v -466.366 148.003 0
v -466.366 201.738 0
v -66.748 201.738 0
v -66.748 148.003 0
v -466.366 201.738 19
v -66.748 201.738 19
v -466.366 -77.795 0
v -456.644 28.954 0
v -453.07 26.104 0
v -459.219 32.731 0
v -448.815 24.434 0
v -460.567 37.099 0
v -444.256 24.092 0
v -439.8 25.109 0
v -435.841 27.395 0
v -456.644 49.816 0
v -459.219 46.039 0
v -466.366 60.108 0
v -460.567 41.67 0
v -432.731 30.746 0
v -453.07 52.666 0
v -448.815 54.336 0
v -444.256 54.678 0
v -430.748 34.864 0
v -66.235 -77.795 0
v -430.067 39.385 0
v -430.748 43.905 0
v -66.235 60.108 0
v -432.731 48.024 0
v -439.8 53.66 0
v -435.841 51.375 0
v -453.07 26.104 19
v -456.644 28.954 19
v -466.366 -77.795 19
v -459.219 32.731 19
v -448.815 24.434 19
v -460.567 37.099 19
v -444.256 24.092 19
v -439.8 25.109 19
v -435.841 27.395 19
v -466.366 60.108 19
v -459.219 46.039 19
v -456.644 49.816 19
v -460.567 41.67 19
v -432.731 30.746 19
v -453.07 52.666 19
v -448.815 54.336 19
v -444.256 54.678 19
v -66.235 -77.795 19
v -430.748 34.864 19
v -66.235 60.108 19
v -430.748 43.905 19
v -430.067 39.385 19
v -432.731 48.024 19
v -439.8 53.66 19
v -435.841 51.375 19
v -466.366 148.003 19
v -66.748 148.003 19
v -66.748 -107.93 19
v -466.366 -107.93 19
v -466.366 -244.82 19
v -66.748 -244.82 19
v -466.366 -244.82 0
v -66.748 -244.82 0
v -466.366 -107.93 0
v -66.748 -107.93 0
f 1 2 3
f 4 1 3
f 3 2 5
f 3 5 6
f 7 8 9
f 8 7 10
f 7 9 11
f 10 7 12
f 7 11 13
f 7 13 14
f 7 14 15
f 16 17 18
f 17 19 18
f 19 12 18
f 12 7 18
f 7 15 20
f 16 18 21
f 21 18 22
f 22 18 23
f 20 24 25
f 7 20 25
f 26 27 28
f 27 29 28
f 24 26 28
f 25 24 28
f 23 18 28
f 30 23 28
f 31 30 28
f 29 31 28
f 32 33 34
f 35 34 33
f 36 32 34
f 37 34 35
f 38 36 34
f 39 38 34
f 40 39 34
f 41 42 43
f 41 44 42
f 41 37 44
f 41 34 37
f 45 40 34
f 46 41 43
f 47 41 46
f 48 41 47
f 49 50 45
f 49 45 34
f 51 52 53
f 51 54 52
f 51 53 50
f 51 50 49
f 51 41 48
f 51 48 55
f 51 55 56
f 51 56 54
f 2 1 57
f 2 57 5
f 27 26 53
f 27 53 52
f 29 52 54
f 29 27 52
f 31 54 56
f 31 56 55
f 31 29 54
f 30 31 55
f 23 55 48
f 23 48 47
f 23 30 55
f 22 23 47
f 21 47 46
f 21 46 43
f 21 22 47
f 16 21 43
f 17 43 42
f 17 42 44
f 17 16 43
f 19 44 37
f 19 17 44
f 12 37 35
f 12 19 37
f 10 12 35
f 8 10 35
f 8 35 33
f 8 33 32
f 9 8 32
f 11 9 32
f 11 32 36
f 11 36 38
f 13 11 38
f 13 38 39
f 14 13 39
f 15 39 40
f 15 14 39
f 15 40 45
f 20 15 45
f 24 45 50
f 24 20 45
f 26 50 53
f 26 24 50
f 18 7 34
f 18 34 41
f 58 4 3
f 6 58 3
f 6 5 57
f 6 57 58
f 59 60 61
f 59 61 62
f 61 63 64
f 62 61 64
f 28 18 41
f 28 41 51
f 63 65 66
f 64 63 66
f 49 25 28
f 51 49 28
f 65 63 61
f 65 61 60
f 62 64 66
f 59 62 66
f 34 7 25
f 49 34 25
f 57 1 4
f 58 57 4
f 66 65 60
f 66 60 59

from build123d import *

# Parameters (mm, degrees)
F0_W     = 399.618358
F0_H     = 136.889741
F0_H_2   = 53.735167
F0_W_2   = 400.13127
F0_H_3   = 137.90302
F0_R     = 15.335777
F0_R_2   = 10.233177
F1_DEPTH = 19


with BuildPart() as f1:
    # F0 (on Top) → F1 (new body)
    with BuildSketch(Plane.XY):
        with Locations((-266.556695, -176.374637)):
            Rectangle(F0_W, F0_H)
        with Locations((-266.556695, 174.870669)):
            Rectangle(F0_W, F0_H_2)
        with Locations((-266.300239, -8.843094)):
            Rectangle(F0_W_2, F0_H_3)
        with BuildLine():
            ThreePointArc((-336.545243, -28.746858), (-350.150513, -34.382346), (-344.515026, -20.777075))
            ThreePointArc((-344.515026, -20.777075), (-338.879538, -23.111371), (-336.545243, -28.746858))
        make_face(mode=Mode.SUBTRACT)
        with Locations((-445.402294, 39.384797)):
            Circle(F0_R, mode=Mode.SUBTRACT)
        Polygon((-354.99683, 0), (-344.515026, 32.833677), (-336.65368, 0), (-344.515026, -9.322512), align=None, mode=Mode.SUBTRACT)
        Polygon((-297.34695, 0), (-284.244716, 32.833677), (-272.251386, 0), (-246.248215, -14.33439), (-272.251386, -23.586301), (-284.244716, -53.641111), (-297.34695, -24.791258), (-323.551446, -14.33439), align=None, mode=Mode.SUBTRACT)
        with BuildLine():
            ThreePointArc((-336.545243, -28.746858), (-338.879538, -23.111371), (-344.515026, -20.777075))
            ThreePointArc((-344.515026, -20.777075), (-350.150513, -34.382346), (-336.545243, -28.746858))
        make_face()
        Polygon((-344.515026, 6.629196), (-354.99683, 0), (-344.515026, -9.322512), (-336.65368, 0), align=None)
        Polygon((-336.65368, 0), (-344.515026, 32.833677), (-354.99683, 0), (-344.515026, 6.629196), align=None)
        Polygon((-272.251386, 0), (-284.244716, 32.833677), (-297.34695, 0), (-323.551446, -14.33439), (-297.34695, -24.791258), (-284.244716, -53.641111), (-272.251386, -23.586301), (-246.248215, -14.33439), align=None)
        with Locations((-284.244716, -10.403717)):
            Circle(F0_R_2, mode=Mode.SUBTRACT)
        with Locations((-284.244716, -10.403717)):
            Circle(F0_R_2)
    extrude(amount=F1_DEPTH)


solid = f1.part
